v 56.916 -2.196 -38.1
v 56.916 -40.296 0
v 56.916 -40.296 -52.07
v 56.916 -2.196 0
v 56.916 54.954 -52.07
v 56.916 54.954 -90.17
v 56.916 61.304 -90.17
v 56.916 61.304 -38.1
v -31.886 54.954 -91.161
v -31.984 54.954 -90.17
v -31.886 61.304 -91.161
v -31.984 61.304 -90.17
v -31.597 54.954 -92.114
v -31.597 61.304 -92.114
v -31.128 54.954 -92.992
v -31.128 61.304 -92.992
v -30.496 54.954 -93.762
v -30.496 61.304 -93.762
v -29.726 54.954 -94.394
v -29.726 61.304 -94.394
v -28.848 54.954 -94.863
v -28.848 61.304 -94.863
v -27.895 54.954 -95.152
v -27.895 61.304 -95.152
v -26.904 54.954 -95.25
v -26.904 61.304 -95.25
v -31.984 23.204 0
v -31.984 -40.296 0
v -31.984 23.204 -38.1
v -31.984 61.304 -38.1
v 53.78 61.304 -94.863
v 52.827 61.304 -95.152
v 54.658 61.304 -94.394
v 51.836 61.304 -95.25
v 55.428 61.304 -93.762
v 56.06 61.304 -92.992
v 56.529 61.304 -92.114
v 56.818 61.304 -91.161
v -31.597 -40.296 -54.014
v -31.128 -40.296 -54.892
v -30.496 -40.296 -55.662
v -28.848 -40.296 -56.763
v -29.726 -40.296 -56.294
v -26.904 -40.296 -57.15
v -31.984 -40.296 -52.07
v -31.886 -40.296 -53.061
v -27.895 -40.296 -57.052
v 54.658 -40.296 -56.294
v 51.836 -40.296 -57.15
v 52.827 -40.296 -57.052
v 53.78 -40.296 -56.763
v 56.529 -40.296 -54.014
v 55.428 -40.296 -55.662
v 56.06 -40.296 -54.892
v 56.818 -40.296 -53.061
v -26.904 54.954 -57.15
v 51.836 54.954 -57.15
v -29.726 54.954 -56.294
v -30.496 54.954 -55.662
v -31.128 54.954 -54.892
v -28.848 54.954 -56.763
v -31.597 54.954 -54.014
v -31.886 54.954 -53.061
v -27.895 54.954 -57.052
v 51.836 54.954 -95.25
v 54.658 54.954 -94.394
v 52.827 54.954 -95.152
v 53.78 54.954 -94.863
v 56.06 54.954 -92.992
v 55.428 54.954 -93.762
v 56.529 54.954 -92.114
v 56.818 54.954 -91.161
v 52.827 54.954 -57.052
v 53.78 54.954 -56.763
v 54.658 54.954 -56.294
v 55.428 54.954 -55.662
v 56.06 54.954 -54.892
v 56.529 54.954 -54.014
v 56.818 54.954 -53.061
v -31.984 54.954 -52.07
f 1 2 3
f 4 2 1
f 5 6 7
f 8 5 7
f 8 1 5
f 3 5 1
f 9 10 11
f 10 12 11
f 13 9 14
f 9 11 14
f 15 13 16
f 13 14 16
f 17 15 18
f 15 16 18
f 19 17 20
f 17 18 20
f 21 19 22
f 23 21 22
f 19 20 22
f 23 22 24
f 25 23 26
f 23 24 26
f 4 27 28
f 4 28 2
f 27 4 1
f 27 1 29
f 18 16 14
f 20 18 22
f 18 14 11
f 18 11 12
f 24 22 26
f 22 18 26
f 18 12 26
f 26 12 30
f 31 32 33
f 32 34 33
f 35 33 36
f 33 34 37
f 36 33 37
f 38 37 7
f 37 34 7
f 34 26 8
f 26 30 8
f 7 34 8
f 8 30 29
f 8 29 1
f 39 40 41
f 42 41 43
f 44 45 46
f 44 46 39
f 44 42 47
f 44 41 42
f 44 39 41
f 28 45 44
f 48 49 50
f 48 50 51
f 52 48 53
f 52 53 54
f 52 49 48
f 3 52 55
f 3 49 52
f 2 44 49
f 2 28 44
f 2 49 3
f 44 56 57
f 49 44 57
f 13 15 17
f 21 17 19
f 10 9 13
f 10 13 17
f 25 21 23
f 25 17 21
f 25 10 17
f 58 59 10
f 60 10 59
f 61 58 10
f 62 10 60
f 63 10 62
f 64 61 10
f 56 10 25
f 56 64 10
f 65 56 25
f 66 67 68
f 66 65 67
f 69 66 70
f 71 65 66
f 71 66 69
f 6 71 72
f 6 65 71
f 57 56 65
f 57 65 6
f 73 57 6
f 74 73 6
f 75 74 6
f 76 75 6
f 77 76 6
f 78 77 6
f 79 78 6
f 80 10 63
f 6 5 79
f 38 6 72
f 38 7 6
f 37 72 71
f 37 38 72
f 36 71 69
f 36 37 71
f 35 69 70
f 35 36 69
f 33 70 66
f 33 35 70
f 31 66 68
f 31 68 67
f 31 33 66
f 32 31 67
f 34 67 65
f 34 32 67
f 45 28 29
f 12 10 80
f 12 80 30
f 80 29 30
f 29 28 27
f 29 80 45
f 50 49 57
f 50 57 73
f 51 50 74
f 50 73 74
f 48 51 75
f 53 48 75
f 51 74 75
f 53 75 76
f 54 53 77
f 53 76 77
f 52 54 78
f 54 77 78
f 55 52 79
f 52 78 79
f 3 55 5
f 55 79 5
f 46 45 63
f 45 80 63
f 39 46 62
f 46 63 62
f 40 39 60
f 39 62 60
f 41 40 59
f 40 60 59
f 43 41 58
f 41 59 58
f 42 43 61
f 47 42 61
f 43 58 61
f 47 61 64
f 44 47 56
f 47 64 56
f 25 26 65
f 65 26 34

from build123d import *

# Parameters (mm, degrees)
F1_DEPTH = 38.1
F2_W     = 88.9
F2_H     = 101.6
F3_DEPTH = 19.05
F4_W     = 88.9
F4_H     = 6.35
F5_DEPTH = 38.1
F8_R     = 5.08


with BuildPart() as f1:
    # F0 (on Top) → F1 (new body)
    with BuildSketch(Plane.XY):
        Polygon((-31.983944577, 23.2039450469), (-31.983944577, -40.2960549531), (56.916055423, -40.2960549531), (56.916055423, -2.1960549531), align=None)
    extrude(amount=F1_DEPTH)

    # F2 (on face) → F3 (join)
    with BuildSketch(Plane.XY.offset(38.1)):
        with Locations((12.466055423, 10.5039450469)):
            Rectangle(F2_W, F2_H)
    extrude(amount=F3_DEPTH)

    # F4 (on face) → F5 (join)
    with BuildSketch(Plane.XY.offset(57.15)):
        with Locations((12.466055423, 58.1289450469)):
            Rectangle(F4_W, F4_H)
    extrude(amount=F5_DEPTH)


with BuildPart() as f6_1:
    # F6: instance of F1
    add(f1.part.mirror(Plane.XY))

    # F8
    f8_edges = [f6_1.edges().sort_by_distance(p)[0] for p in [
        (56.916055, 7.328945, -57.15),
        (-31.983945, 7.328945, -57.15),
        (56.916055, 58.128945, -95.25),
        (-31.983945, 58.128945, -95.25),
    ]]
    fillet(f8_edges, radius=F8_R)


solid = f6_1.part
